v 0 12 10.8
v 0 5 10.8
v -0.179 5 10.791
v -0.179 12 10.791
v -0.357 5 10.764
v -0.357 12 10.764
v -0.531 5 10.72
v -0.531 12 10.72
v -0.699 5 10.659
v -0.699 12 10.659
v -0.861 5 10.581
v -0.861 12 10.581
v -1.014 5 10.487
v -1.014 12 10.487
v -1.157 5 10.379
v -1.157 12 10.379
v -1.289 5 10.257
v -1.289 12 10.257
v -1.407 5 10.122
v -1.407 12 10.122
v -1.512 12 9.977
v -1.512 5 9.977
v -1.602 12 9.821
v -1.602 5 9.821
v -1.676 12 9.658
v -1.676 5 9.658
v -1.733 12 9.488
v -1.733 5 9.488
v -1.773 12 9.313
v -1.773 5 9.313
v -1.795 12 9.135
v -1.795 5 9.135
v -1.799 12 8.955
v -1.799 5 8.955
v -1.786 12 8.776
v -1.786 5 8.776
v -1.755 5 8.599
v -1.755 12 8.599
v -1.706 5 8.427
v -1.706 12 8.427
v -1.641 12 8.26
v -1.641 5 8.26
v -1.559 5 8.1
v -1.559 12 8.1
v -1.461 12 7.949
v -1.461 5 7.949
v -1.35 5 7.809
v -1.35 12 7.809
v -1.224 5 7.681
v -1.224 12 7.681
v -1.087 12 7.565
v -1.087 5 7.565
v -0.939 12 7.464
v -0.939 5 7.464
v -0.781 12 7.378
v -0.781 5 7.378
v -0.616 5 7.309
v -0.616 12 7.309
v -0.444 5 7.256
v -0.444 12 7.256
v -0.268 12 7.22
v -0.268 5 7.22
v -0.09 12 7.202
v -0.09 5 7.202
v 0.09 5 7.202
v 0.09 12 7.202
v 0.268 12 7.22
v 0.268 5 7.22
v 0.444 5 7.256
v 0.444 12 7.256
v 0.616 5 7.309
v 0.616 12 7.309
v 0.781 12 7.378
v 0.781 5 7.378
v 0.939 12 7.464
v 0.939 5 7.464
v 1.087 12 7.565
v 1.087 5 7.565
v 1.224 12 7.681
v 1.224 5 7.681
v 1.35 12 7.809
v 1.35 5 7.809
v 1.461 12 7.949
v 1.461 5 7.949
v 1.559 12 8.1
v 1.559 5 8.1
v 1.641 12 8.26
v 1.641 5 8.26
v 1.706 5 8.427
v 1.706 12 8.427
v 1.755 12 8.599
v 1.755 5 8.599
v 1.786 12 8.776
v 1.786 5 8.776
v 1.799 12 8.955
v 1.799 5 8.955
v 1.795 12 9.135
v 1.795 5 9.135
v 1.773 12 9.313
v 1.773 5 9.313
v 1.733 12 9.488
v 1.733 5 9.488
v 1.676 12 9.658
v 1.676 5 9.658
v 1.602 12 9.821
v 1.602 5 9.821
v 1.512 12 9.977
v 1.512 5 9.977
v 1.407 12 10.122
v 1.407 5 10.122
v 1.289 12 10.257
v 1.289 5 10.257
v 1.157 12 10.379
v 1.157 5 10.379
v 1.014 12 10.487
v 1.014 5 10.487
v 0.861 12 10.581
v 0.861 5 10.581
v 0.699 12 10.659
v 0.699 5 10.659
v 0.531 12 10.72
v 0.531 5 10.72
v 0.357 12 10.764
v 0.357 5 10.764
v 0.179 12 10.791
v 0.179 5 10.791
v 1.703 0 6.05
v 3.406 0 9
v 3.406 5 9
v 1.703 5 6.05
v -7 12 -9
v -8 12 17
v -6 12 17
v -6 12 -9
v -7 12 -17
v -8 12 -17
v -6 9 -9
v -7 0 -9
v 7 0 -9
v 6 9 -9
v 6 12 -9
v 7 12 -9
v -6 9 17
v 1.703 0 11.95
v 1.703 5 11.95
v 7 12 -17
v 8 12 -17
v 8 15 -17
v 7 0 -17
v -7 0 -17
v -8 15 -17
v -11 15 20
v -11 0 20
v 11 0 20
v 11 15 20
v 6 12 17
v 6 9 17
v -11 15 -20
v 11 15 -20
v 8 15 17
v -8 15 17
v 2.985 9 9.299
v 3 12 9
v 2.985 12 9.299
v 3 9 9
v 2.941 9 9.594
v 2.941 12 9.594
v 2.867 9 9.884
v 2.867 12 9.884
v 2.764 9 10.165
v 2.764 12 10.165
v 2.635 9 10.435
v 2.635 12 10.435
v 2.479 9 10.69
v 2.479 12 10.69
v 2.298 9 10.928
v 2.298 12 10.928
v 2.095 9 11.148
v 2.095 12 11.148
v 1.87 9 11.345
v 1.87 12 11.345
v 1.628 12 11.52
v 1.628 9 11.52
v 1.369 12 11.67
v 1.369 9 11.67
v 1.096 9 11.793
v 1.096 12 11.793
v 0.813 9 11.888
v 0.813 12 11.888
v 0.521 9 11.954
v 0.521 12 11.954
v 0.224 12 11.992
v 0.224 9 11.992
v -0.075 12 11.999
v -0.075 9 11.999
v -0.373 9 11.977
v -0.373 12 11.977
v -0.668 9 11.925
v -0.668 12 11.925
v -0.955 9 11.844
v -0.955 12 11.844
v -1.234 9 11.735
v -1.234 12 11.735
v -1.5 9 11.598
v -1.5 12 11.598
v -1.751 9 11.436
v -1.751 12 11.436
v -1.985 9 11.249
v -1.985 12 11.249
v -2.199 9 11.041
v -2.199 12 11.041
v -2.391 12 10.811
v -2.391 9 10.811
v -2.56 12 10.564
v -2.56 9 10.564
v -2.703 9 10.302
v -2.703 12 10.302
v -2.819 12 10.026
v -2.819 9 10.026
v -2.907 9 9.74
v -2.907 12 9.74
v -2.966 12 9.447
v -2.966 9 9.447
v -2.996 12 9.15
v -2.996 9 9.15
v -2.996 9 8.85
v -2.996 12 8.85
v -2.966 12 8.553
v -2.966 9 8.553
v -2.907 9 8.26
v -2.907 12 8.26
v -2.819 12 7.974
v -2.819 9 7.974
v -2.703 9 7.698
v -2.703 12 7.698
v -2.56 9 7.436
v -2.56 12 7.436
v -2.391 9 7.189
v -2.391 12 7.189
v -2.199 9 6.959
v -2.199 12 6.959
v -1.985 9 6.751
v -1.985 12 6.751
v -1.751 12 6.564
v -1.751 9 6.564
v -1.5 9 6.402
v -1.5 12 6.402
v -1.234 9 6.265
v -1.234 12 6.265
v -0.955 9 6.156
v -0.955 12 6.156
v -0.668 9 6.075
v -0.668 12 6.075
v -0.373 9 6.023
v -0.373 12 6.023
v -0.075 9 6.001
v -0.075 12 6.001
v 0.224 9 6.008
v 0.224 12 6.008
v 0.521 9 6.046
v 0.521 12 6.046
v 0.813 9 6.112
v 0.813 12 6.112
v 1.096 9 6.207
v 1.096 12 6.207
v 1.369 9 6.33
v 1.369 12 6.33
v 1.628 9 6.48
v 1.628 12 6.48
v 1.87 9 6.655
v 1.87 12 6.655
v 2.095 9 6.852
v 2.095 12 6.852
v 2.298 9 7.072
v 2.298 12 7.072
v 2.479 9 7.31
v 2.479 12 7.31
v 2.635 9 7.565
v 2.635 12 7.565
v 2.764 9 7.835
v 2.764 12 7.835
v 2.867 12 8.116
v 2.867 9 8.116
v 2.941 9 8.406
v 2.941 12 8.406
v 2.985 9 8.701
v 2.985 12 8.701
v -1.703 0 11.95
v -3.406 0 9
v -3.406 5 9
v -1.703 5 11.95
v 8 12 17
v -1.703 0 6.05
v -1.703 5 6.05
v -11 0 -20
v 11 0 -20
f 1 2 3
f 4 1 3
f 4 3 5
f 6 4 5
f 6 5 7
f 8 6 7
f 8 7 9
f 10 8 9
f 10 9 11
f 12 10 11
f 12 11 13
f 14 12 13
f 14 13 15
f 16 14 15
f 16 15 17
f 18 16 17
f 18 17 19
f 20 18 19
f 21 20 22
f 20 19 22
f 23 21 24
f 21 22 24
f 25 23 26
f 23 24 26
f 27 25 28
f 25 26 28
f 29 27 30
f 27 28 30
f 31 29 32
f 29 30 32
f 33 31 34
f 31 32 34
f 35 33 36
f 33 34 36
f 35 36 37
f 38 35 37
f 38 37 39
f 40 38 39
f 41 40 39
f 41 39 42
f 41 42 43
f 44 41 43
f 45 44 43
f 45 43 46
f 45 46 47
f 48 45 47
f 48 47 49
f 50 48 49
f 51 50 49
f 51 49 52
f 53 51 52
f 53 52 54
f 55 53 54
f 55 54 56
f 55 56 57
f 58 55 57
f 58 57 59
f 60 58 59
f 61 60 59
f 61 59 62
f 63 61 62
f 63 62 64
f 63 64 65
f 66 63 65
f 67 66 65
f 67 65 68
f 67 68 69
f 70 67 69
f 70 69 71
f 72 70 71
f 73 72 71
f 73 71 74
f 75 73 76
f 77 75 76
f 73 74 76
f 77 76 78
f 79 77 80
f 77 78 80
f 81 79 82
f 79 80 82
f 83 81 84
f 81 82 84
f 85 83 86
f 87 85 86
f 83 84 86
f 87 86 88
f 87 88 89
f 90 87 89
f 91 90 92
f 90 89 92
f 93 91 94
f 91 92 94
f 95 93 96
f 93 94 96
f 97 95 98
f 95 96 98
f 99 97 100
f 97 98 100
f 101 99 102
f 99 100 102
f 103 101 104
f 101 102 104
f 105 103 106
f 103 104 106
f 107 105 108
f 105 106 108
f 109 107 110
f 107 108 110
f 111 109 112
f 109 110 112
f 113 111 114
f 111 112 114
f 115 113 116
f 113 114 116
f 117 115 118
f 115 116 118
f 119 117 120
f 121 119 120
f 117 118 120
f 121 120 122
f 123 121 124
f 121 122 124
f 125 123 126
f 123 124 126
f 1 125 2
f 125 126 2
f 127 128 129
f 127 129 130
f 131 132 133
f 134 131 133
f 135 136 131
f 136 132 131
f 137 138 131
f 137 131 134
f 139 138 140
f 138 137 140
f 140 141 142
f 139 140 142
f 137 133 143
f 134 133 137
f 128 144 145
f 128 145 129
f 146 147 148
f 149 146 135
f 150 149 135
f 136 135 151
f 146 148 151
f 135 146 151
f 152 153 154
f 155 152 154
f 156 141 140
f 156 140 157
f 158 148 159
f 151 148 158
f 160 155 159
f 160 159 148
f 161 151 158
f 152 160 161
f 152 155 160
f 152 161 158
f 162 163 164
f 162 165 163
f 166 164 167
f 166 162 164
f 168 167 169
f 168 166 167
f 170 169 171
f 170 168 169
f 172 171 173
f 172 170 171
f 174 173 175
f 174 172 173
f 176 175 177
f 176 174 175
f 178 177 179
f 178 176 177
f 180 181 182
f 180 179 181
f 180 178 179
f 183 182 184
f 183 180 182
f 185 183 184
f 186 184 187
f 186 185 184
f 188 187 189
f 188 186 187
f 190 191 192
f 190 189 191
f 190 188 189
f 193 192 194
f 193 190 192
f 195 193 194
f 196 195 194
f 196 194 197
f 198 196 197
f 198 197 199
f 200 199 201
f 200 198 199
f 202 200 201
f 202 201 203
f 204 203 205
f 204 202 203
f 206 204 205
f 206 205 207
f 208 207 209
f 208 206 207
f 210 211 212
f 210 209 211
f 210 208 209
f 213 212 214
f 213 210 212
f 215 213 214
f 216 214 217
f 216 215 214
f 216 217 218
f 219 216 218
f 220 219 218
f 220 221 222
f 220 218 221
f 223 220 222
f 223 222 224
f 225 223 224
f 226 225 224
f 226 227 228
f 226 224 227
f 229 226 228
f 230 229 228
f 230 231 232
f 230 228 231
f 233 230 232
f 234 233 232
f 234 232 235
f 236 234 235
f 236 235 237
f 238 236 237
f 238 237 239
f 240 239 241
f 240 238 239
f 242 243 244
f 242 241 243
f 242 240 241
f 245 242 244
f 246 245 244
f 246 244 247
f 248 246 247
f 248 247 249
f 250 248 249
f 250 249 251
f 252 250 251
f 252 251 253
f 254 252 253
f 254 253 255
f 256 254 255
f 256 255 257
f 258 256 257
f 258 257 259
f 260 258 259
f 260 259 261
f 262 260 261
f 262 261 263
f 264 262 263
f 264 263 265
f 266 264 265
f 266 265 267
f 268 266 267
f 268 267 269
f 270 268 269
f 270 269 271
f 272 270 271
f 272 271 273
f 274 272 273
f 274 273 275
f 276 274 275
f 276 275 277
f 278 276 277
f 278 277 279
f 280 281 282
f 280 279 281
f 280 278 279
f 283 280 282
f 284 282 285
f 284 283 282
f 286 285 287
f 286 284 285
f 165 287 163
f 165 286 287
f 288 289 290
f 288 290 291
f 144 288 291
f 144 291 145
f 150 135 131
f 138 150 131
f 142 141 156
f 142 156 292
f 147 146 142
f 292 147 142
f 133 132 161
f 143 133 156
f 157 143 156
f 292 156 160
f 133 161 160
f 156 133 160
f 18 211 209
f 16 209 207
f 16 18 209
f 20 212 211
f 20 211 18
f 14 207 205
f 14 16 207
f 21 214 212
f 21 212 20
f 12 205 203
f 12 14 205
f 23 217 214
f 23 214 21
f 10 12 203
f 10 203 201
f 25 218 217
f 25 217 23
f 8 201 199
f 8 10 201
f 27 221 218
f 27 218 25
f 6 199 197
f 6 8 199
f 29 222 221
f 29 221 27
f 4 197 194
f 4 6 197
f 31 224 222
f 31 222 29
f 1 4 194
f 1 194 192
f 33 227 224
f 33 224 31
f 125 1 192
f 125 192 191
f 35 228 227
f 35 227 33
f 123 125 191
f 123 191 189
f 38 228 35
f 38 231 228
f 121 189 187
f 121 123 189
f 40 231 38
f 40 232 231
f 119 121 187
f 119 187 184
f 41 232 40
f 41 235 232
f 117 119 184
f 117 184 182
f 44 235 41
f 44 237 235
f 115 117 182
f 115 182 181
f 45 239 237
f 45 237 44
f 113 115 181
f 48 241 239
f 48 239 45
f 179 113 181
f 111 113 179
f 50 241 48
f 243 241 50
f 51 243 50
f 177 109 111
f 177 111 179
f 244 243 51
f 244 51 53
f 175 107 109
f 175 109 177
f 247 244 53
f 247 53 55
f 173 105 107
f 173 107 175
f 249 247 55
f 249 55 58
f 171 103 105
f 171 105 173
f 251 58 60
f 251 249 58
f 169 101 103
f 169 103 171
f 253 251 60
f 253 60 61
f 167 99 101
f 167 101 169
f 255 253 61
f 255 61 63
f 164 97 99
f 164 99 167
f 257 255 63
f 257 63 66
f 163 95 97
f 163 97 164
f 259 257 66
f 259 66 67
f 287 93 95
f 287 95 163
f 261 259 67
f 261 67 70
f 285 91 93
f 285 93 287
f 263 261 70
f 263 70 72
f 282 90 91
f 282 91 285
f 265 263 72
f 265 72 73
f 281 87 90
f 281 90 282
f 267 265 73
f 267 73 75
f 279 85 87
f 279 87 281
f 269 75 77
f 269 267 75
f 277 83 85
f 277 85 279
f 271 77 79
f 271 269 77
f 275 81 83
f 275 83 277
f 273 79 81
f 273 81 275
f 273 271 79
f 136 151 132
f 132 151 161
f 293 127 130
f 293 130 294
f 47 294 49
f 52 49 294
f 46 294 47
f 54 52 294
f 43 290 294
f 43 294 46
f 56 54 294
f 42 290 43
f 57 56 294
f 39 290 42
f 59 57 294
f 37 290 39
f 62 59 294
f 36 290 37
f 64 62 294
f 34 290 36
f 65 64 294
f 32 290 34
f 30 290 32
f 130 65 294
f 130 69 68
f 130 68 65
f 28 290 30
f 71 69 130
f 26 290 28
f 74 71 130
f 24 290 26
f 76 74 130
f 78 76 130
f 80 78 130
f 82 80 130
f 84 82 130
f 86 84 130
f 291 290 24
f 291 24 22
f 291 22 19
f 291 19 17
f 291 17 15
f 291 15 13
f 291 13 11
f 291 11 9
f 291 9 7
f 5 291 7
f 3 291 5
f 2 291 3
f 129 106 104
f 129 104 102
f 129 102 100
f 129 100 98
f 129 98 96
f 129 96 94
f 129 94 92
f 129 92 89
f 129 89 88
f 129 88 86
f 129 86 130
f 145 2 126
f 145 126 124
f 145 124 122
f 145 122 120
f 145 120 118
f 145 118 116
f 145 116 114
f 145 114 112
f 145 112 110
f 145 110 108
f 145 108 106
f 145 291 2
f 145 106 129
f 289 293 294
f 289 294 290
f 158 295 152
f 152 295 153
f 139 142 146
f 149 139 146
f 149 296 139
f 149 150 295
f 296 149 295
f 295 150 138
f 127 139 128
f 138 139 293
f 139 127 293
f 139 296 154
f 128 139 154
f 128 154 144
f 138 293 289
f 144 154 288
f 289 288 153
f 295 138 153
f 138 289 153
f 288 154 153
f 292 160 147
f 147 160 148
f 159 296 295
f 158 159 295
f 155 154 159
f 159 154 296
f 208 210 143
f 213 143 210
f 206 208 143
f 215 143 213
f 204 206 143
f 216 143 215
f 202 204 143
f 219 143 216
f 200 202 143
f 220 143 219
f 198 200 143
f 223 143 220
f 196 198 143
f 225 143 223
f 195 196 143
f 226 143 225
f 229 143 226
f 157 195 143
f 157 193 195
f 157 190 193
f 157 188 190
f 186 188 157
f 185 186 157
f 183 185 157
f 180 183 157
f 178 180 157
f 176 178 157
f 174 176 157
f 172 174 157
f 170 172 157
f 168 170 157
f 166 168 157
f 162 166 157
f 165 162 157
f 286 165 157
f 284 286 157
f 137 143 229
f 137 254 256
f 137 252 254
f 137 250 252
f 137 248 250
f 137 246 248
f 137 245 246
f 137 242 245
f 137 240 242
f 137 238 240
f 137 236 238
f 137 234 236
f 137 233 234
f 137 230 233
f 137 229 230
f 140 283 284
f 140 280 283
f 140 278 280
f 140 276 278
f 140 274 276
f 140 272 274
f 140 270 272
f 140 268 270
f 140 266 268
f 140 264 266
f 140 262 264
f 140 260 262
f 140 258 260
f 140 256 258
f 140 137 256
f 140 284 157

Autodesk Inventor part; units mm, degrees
ref_plane "YZ Plane" through (0, 0, 0) normal (1, 0, 0) x (0, 1, 0)
ref_plane "XZ Plane" through (0, 0, 0) normal (0, 1, 0) x (-1, 0, 0)
ref_plane "XY Plane" through (0, 0, 0) normal (0, 0, 1) x (1, 0, 0)
sketch "Sketch1" plane through (0, 0, 0) normal (0, 1, 0) x (-1, 0, 0)
  line L0 (11, 20) -> (-11, 20)
  line L1 (-11, 20) -> (-11, -20)
  line L2 (-11, -20) -> (11, -20)
  line L3 (11, -20) -> (11, 20)
  line L4 (11, 20) -> (-11, -20) construction
  line L5 (-11, 20) -> (11, -20) construction
  dimension "d0" = 22
  dimension "d1" = 40
extrude "Extrusion1" add sketch "Sketch1" along normal blind 15
sketch "Sketch2" plane through (0, 15, 0) normal (0, 1, 0) x (1, 0, 0)
  line L0 (-8, -17) -> (8, -17)
  line L1 (8, -17) -> (8, 17)
  line L2 (8, 17) -> (-8, 17)
  line L3 (-8, 17) -> (-8, -17)
  line L4 (-8, -17) -> (8, 17) construction
  line L5 (8, -17) -> (-8, 17) construction
  point P0 (0, 0)
  dimension "d6" = 16
  dimension "d7" = 34
extrude "Extrusion2" cut sketch "Sketch2" against normal blind 3
sketch "Sketch3" plane through (0, 12, 0) normal (0, 1, 0) x (1, 0, 0)
  line L0 (6, -17) -> (-6, -17)
  line L1 (-6, -17) -> (-6, 17)
  line L2 (-6, 17) -> (6, 17)
  line L3 (6, 17) -> (6, -17)
  line L4 (6, -17) -> (-6, 17) construction
  line L5 (-6, -17) -> (6, 17) construction
  point P0 (0, 0)
  dimension "d10" = 12
  dimension "d11" = 34
extrude "Extrusion3" cut sketch "Sketch3" against normal blind 3
sketch "Sketch4" plane through (0, 15, 0) normal (0, 1, 0) x (1, 0, 0)
  line L0 (-7, 9) -> (7, 9)
  line L1 (7, 9) -> (7, 17)
  line L2 (7, 17) -> (-7, 17)
  line L3 (-7, 17) -> (-7, 9)
  line L4 (-7, 9) -> (7, 17) construction
  line L5 (7, 9) -> (-7, 17) construction
  point P0 (0, 0)
  point P1 (0, 13)
  dimension "d14" = 14
  dimension "d15" = 8
extrude "Extrusion4" cut sketch "Sketch4" against normal through all
sketch "Sketch5" plane through (0, 9, 0) normal (0, 1, 0) x (1, 0, 0)
  circle A0 centre (0, -9) radius 3
  point P0 (0, 0)
  dimension "d18" = 6
extrude "Extrusion5" add sketch "Sketch5" along normal up to surface (3 mm away)
sketch "Sketch6" plane through (0, 12, 9) normal (0, 1, 0) x (1, 0, 0)
  point P0 (0, 9)
  point P1 (0, 0)
  point P2 (0, 0)
hole "Hole1" at (0, 12, 9) direction (0, -1, 0) diameter 3.6 end through all clearance for "Socket Head Cap Screw DIN EN ISO 4762" size "M3" standard "DIN"
sketch "Sketch7" plane through (0, 0, 0) normal (0, -1, 0) x (1, 0, 0)
  circle A0 centre (0, 9) radius 1.8 projected
  line L0 (1.7032, 11.95) -> (3.4064, 9)
  line L1 (3.4064, 9) -> (1.7032, 6.05)
  line L2 (1.7032, 6.05) -> (-1.7032, 6.05)
  line L3 (-1.7032, 6.05) -> (-3.4064, 9)
  line L4 (-3.4064, 9) -> (-1.7032, 11.95)
  line L5 (-1.7032, 11.95) -> (1.7032, 11.95)
  point P0 (0, 0)
  point P1 (0, 11.95)
extrude "Extrusion6" cut sketch "Sketch7" against normal blind 5
properties part number "Holder"
